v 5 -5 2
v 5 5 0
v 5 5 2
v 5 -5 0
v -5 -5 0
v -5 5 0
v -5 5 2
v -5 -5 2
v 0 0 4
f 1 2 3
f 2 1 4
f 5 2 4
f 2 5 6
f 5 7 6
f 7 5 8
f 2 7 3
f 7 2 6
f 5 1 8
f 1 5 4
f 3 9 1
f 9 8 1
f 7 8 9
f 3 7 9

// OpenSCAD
//=============================================================================
// One of these is used for each face of the TranslationManip in MakerVR.
//=============================================================================

module Pyramid(baseSize = 10, height = 10) {
     bsh = baseSize / 2;
     points = [
          // Base.
          [ bsh,  bsh, 0],
          [ bsh, -bsh, 0],
          [-bsh, -bsh, 0],
          [-bsh,  bsh, 0],
          // Pointy top.
          [0, 0, height]
     ];
     faces = [
          // Sides.
          [0, 4, 1], [1, 4, 2], [2, 4, 3], [3, 4, 0],
          // Base
          [1, 3, 0], [2, 3, 1]
     ];

     polyhedron(points = points, faces = faces);
}

module TranslationFace() {
     translate([0, 0, 1]) cube([10, 10, 2], center = true);
     translate([0, 0, 2]) Pyramid(baseSize = 10, height = 2);
}

TranslationFace();
